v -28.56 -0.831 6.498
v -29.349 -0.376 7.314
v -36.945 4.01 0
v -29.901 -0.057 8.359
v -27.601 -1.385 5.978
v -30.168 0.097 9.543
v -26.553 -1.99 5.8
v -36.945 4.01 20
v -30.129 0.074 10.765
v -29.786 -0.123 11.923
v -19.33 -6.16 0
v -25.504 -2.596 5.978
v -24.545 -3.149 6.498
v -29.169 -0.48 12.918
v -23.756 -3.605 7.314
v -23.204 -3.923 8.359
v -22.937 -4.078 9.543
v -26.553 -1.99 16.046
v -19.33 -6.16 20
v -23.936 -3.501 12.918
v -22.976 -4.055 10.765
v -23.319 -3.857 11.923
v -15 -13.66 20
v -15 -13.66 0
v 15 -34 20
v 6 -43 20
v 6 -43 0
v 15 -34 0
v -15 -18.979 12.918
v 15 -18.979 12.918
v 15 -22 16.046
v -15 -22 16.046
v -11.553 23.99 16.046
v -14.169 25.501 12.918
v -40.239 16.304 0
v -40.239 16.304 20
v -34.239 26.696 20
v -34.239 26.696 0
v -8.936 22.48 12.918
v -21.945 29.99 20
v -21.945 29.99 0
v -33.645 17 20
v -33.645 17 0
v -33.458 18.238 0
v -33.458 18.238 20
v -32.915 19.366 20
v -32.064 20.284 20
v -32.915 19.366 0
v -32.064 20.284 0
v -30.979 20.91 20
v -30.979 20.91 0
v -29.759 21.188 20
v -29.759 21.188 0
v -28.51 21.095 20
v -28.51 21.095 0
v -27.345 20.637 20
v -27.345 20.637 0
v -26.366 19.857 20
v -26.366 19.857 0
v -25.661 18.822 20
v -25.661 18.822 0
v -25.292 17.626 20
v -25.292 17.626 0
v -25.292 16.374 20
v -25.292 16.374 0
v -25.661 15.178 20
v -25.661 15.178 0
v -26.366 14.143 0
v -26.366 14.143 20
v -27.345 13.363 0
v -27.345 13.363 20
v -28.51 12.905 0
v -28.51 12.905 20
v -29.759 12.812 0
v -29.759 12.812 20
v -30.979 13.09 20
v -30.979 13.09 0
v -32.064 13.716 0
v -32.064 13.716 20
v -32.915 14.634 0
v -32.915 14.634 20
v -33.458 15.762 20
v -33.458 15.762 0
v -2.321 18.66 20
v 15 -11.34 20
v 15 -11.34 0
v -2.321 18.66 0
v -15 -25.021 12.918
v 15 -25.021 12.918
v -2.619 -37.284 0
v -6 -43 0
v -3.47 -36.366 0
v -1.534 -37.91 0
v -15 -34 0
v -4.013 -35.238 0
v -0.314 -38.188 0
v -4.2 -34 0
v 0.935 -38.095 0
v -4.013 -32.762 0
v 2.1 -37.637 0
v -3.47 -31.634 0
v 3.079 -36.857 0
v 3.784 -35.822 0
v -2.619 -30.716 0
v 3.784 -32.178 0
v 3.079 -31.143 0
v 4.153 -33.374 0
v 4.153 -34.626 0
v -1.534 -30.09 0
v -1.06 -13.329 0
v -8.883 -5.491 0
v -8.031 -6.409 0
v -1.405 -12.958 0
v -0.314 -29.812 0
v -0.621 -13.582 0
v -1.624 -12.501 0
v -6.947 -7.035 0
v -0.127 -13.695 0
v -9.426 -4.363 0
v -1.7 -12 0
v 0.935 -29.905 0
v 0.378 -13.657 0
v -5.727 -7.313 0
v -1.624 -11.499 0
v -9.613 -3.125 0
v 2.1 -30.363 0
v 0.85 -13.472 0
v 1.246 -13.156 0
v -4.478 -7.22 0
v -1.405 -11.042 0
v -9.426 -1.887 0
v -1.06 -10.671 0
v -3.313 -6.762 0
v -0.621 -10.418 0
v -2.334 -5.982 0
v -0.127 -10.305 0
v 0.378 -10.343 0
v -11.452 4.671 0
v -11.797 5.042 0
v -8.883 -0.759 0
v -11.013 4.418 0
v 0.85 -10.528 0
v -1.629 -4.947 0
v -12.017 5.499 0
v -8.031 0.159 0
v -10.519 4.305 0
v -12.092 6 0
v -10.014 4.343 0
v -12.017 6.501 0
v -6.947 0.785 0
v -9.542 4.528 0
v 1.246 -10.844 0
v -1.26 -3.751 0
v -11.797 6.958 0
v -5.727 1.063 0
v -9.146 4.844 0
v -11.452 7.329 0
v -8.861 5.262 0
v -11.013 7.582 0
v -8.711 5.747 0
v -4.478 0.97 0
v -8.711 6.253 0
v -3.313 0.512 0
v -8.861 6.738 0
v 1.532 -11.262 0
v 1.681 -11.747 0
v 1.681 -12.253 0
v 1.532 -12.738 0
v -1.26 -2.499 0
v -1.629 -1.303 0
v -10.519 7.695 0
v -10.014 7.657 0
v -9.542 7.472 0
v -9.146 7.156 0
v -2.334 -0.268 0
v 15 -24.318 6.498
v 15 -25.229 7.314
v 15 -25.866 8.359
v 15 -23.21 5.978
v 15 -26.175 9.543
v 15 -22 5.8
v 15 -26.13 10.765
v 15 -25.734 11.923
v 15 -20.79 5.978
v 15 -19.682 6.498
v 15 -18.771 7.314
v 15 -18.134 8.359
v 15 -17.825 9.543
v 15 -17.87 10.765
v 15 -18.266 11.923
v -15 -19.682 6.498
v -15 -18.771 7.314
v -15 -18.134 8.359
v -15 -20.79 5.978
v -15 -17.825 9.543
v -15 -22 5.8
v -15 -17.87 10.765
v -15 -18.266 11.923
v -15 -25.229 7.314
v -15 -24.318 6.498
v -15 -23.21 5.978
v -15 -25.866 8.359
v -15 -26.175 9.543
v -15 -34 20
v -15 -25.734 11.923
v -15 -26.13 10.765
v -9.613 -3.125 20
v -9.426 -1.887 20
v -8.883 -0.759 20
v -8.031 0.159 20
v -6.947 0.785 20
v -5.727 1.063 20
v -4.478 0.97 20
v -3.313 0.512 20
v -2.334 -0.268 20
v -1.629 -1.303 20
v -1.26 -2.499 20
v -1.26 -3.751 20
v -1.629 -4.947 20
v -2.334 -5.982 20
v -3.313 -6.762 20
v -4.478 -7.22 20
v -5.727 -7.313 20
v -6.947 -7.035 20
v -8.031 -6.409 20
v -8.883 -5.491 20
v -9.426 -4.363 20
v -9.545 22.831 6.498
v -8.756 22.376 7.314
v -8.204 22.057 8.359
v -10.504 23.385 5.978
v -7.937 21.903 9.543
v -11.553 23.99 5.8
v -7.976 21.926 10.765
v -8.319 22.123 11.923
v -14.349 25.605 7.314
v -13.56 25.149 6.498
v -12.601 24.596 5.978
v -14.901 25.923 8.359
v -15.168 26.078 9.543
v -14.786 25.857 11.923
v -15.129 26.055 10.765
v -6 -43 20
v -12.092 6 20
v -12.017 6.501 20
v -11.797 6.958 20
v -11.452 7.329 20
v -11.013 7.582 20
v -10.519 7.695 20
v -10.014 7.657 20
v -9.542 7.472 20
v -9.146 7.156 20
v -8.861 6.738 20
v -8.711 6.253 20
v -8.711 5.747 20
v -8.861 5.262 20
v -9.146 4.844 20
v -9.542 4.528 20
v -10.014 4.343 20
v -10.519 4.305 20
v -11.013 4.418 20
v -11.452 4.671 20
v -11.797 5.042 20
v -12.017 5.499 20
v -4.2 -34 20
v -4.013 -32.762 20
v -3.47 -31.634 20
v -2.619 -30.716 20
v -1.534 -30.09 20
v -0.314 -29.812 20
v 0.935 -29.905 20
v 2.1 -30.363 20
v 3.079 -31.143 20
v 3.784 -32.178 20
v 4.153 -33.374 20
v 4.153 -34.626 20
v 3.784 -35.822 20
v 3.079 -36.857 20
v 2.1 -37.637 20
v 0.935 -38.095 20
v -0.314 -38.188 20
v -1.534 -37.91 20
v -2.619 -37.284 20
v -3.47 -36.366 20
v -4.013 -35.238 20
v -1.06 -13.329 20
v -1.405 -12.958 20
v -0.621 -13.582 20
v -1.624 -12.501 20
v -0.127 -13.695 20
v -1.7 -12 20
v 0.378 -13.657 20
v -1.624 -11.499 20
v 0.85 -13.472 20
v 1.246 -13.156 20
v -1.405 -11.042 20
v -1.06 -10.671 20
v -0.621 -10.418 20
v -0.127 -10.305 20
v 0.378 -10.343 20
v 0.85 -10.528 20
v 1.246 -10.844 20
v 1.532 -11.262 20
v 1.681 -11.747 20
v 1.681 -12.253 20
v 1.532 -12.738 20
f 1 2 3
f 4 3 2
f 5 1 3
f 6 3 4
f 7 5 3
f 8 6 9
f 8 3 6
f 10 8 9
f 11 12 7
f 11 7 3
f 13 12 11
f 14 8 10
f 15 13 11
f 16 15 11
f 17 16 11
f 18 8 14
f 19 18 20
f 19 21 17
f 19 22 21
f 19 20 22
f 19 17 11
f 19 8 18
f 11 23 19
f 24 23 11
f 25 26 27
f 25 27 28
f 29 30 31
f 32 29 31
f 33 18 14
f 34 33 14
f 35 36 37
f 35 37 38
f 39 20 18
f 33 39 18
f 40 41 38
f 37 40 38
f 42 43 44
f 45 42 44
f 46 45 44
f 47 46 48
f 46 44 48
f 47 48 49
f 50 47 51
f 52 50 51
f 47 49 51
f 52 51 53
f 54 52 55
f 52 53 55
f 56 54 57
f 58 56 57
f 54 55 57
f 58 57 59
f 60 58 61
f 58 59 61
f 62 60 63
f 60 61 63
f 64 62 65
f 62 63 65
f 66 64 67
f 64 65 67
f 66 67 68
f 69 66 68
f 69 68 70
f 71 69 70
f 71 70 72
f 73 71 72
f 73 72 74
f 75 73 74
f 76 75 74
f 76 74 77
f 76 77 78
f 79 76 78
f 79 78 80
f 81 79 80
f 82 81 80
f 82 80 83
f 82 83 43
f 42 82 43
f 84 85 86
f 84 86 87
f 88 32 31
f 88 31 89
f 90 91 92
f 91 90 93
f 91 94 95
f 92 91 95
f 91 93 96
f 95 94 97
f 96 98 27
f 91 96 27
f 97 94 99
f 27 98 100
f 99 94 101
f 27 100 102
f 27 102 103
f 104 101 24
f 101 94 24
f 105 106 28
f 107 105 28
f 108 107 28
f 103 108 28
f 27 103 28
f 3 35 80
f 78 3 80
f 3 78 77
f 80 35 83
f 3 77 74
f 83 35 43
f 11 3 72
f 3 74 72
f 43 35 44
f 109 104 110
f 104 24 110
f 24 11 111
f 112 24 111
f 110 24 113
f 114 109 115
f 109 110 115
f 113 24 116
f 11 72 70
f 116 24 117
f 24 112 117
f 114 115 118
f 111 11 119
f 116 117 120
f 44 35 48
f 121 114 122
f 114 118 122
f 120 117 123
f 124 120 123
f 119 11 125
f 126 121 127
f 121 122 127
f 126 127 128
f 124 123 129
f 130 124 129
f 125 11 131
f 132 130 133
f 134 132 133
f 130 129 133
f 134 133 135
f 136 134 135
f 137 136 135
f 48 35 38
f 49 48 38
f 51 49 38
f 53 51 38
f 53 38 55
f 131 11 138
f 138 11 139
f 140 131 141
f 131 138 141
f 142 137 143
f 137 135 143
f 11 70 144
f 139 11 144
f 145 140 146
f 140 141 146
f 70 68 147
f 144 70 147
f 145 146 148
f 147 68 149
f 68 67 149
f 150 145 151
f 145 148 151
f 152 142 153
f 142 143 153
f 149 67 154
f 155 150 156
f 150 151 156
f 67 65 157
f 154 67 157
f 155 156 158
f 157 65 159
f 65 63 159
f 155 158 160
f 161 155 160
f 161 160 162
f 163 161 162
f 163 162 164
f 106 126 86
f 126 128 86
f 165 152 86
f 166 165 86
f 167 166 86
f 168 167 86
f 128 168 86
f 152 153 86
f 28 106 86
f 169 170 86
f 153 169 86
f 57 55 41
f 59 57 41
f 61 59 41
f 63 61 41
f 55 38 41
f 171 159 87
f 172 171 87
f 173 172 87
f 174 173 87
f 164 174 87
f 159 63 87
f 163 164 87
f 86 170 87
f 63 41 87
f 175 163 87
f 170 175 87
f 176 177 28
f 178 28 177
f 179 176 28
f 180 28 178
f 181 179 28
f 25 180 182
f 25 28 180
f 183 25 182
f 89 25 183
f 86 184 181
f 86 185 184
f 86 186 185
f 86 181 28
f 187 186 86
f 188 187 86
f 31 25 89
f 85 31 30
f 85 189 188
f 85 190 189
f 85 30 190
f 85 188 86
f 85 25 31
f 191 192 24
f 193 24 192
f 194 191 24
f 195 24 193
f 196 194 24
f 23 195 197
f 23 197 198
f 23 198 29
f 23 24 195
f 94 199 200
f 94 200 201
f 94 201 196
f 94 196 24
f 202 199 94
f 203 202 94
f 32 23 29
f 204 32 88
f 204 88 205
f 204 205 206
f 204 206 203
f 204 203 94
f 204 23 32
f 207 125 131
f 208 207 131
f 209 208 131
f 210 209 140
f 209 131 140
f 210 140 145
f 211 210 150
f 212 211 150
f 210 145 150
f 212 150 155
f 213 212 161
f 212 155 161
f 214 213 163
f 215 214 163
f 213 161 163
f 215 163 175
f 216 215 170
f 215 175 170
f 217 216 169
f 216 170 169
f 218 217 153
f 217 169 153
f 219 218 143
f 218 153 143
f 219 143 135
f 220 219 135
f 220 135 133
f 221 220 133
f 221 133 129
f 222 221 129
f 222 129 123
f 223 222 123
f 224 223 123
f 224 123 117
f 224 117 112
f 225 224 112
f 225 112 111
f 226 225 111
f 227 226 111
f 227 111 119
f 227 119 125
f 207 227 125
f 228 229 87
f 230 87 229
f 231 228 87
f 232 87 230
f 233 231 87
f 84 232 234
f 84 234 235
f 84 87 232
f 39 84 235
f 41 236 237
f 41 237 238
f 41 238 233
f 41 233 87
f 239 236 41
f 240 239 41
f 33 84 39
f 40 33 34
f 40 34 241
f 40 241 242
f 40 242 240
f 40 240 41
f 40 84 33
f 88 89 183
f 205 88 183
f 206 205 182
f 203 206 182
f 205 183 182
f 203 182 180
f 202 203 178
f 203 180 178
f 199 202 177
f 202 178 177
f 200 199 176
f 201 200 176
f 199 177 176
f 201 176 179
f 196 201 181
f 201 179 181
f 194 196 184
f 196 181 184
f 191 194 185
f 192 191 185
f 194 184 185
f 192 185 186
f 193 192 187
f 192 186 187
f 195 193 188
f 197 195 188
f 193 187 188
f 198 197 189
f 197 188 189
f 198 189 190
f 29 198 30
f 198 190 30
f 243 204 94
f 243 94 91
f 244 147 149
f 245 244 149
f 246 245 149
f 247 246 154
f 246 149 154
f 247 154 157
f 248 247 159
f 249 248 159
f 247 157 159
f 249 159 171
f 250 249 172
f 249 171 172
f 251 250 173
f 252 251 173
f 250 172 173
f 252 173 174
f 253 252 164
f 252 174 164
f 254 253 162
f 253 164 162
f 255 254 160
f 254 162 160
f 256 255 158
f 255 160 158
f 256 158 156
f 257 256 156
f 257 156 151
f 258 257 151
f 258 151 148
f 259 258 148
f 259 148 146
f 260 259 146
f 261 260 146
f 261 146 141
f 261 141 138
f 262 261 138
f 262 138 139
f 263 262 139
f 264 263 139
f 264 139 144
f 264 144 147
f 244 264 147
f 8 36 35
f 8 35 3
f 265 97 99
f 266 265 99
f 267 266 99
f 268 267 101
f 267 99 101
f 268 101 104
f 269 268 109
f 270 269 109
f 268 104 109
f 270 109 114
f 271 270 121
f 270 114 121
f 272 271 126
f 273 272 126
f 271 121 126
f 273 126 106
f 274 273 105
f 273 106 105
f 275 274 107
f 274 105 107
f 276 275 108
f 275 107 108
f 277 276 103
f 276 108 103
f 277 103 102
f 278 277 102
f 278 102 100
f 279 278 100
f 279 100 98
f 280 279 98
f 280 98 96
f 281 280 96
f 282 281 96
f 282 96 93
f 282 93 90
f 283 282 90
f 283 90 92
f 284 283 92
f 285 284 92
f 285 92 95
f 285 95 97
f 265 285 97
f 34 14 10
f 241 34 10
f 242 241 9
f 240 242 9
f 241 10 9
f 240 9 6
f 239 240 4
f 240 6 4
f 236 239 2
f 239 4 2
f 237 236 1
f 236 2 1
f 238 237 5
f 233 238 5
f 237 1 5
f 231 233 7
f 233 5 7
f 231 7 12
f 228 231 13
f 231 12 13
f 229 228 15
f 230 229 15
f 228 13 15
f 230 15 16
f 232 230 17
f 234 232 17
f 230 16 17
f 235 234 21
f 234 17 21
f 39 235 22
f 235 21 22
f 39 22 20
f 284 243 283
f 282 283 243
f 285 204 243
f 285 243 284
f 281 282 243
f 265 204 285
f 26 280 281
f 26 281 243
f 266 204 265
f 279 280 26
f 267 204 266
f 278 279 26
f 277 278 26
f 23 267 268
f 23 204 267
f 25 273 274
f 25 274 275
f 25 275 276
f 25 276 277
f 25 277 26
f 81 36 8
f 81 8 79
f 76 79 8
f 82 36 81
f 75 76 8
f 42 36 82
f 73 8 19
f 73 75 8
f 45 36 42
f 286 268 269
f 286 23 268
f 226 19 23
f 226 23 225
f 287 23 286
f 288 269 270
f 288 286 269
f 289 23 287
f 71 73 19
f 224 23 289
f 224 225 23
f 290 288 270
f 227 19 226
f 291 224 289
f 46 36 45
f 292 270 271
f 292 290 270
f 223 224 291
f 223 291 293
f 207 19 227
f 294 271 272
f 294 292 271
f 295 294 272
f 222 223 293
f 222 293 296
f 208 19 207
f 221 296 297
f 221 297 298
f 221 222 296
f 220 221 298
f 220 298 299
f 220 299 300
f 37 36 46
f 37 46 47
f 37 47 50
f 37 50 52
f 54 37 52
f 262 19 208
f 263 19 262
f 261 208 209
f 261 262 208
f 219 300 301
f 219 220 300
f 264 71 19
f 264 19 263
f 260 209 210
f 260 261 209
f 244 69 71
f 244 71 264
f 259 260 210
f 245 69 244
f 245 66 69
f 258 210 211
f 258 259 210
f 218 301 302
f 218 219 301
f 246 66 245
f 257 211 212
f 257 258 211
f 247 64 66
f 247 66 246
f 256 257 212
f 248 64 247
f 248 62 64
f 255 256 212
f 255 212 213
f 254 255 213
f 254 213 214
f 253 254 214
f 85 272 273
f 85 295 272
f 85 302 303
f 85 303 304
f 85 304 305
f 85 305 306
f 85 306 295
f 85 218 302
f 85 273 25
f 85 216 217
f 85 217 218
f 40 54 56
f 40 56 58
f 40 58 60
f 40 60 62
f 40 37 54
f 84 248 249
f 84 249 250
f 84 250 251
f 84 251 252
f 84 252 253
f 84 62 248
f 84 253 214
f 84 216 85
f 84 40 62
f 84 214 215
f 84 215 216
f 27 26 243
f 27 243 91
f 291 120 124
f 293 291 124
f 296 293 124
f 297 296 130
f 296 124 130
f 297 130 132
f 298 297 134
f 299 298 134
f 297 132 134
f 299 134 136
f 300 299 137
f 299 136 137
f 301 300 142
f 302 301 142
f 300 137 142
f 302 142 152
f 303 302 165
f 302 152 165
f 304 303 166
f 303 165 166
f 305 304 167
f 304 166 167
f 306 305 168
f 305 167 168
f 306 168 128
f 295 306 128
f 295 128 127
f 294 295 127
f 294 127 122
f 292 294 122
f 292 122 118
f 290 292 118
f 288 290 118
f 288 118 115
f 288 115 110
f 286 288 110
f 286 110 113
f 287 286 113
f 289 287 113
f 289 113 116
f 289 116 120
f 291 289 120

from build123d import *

# Parameters (mm, degrees)
BOSS_EXTRUDE1_DEPTH = 20
CUT_EXTRUDE1_DEPTH  = 59.888175724
CUT_EXTRUDE2_DEPTH  = 79.101263393
HOLE1_D             = 3.4
HOLE2_D             = 3.4
HOLE3_D             = 8.4
HOLE4_D             = 8.4
HOLE5_D             = 8.4
CHAMFER1_SIZE       = 8.485281374
CHAMFER2_SIZE       = 5
CHAMFER3_SIZE       = 8.485281374


with BuildPart() as part:
    # Sketch1 → Boss-Extrude1 (new body)
    with BuildSketch(Plane.XY.offset(20)):
        Polygon((15, -34), (15, -11.339745962), (-2.320508076, 18.660254038), (-21.944863729, 29.990381057), (-42.435244785, 24.5), (-36.944863729, 4.009618943), (-15, -8.660254038), (-15, -34), (0, -49), align=None)
    extrude(amount=-BOSS_EXTRUDE1_DEPTH)

    # Sketch2 → Cut-Extrude1 (cut, through all)
    with BuildSketch(Plane(origin=(-7.5, -12.990381057, 0), x_dir=(0.8660254037844394, -0.499999999999999, 0), z_dir=(-0.499999999999999, -0.8660254037844394, 0))):
        with BuildLine():
            Line((-18.978772839, 12.917565156), (-22, 16.046137466))
            Line((-22, 16.046137466), (-25.021227161, 12.917565156))
            ThreePointArc((-25.021227161, 12.917565156), (-22, 5.8), (-18.978772839, 12.917565156))
        make_face()
    extrude(amount=-CUT_EXTRUDE1_DEPTH, mode=Mode.SUBTRACT)

    # Sketch3 → Cut-Extrude2 (cut, through all)
    with BuildSketch(Plane(origin=(15, 0, 0), x_dir=(0, 0, -1), z_dir=(1, 0, 0))):
        with BuildLine():
            Line((-12.917565156, -18.978772839), (-16.046137466, -22))
            Line((-16.046137466, -22), (-12.917565156, -25.021227161))
            ThreePointArc((-12.917565156, -25.021227161), (-5.8, -22), (-12.917565156, -18.978772839))
        make_face()
    extrude(amount=-CUT_EXTRUDE2_DEPTH, mode=Mode.SUBTRACT)

    # Hole1 (through all)
    with Locations(Plane.XY.offset(20)):
        with Locations((0, -12)):
            Hole(HOLE1_D / 2)

    # Hole2 (through all)
    with Locations(Plane.XY.offset(20)):
        with Locations((-10.392304845, 6)):
            Hole(HOLE2_D / 2)

    # Hole3 (through all)
    with Locations(Plane.XY.offset(20)):
        with Locations((-5.412658774, -3.125)):
            Hole(HOLE3_D / 2)

    # Hole4 (through all)
    with Locations(Plane.XY.offset(20)):
        with Locations((-29.444863729, 17)):
            Hole(HOLE4_D / 2)

    # Hole5 (through all)
    with Locations(Plane.XY.offset(20)):
        with Locations((0, -34)):
            Hole(HOLE5_D / 2)

    # Chamfer1
    chamfer1_edges = [part.edges().sort_by_distance(p)[0] for p in [
        (-42.435244785, 24.5, 10),
    ]]
    chamfer(chamfer1_edges, length=CHAMFER1_SIZE)

    # Chamfer2
    chamfer2_edges = [part.edges().sort_by_distance(p)[0] for p in [
        (-15, -8.660254038, 10),
    ]]
    chamfer(chamfer2_edges, length=CHAMFER2_SIZE)

    # Chamfer3
    chamfer3_edges = [part.edges().sort_by_distance(p)[0] for p in [
        (0, -49, 10),
    ]]
    chamfer(chamfer3_edges, length=CHAMFER3_SIZE)


solid = part.part
